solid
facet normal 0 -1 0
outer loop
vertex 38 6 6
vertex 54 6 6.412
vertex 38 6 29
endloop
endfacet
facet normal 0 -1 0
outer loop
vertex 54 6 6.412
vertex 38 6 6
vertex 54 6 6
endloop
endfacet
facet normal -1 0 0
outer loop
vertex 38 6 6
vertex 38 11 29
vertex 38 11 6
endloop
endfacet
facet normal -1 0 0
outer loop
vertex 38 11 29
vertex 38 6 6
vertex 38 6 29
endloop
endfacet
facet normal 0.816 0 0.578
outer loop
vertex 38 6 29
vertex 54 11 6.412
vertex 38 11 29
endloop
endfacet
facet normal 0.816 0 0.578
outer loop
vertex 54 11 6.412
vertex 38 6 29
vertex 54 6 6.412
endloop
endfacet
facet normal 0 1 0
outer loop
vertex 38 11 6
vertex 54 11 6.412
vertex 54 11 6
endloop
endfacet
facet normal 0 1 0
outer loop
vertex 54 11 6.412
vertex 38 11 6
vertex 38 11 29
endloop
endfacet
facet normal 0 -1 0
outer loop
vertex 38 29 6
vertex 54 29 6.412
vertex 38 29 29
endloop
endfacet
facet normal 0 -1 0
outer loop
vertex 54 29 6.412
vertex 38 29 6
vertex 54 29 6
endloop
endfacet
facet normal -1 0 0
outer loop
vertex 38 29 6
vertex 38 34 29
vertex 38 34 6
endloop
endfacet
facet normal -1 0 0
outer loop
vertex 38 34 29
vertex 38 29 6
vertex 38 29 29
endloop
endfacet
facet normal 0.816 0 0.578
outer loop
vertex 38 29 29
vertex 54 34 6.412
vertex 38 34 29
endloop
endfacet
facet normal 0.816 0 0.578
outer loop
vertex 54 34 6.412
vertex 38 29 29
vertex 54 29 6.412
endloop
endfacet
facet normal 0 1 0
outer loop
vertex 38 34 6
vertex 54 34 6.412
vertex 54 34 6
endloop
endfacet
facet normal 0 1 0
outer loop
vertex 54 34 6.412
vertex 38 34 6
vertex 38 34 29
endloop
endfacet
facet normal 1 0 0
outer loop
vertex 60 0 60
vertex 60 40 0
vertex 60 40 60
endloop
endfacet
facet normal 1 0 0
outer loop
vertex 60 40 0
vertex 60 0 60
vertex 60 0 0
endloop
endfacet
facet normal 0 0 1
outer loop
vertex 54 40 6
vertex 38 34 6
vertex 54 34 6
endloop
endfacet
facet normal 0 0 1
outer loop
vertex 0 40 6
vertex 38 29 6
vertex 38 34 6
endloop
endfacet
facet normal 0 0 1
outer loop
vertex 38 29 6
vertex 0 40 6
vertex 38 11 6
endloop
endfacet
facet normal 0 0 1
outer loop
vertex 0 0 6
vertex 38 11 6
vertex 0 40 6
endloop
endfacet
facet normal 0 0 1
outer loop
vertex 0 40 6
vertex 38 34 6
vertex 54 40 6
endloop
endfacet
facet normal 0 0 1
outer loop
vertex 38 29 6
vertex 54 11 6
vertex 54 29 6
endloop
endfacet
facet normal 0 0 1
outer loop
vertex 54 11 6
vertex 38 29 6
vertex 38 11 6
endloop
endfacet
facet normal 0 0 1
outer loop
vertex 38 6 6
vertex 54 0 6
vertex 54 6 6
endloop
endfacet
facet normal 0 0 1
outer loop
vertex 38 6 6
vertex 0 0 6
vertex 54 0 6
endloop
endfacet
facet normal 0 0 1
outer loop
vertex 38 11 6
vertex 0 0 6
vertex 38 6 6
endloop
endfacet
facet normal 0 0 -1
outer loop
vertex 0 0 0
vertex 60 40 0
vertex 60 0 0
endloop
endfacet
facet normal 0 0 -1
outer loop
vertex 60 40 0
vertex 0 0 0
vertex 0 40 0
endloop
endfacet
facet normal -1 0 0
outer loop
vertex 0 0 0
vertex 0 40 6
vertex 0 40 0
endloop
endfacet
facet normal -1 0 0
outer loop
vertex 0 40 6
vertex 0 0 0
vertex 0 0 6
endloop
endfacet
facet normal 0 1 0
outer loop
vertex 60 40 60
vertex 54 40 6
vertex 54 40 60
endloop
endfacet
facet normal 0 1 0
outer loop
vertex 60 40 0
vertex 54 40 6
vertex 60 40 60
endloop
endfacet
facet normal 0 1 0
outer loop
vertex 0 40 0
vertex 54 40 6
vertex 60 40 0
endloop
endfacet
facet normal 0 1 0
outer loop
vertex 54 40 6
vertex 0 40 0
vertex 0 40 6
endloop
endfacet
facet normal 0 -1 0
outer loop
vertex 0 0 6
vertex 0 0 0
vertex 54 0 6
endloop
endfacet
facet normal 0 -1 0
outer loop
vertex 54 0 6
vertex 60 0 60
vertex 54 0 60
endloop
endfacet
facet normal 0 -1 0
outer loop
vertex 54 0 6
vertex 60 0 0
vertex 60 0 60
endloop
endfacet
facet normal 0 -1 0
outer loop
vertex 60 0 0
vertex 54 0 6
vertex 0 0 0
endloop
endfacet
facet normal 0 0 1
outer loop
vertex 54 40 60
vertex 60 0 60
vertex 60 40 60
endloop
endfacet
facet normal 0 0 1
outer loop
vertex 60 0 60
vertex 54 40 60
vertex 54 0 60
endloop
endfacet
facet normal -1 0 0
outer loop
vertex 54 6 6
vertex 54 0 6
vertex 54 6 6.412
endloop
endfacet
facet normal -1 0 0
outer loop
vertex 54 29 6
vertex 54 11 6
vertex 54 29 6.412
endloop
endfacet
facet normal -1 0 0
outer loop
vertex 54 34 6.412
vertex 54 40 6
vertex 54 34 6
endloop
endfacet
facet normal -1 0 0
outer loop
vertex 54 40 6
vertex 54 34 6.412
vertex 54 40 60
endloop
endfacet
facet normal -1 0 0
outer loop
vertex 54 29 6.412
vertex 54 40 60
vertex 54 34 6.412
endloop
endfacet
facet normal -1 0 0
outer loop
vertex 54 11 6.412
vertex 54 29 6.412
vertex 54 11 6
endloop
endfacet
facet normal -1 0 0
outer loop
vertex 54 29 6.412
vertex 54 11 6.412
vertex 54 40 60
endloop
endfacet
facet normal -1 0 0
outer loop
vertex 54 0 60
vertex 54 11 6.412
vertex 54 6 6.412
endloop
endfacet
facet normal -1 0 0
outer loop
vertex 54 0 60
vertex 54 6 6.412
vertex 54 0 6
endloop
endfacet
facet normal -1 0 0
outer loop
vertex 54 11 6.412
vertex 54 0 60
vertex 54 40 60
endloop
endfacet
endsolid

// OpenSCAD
$fn = 32;

// ----------------------------------------------------------------------
// Rib bracket: 2-gusset L bracket
// ----------------------------------------------------------------------

// --- parameters (mm) ---
base_l = 60;              // foot length, X
base_w = 40;              // foot width, Y
base_t = 6;               // foot thickness
plate_t = 6;              // upright plate thickness
plate_h = 60;             // overall height
gus_l = 16;               // gusset leg along the foot
gus_h = 24;               // gusset height
gus_t = 5;                // gusset thickness
gus_edge = 6;             // gusset margin from the foot edge
n_gus = 2;                // gusset count

gus_pitch = (base_w - 2 * gus_edge - gus_t) / (n_gus - 1);  // gusset pitch

union() {
  cube([base_l, base_w, base_t]);
  translate([base_l - plate_t, 0, base_t - 1])
    cube([plate_t, base_w, plate_h - base_t + 1]);
  for (i = [0 : n_gus - 1])
    translate([base_l - plate_t - gus_l, gus_edge + i * gus_pitch, base_t - 1])
      rotate([-90, 0, 0])
        linear_extrude(height = gus_t)
          polygon(points = [[0, 0], [gus_l + 1, 0], [0, -gus_h]]);
}
